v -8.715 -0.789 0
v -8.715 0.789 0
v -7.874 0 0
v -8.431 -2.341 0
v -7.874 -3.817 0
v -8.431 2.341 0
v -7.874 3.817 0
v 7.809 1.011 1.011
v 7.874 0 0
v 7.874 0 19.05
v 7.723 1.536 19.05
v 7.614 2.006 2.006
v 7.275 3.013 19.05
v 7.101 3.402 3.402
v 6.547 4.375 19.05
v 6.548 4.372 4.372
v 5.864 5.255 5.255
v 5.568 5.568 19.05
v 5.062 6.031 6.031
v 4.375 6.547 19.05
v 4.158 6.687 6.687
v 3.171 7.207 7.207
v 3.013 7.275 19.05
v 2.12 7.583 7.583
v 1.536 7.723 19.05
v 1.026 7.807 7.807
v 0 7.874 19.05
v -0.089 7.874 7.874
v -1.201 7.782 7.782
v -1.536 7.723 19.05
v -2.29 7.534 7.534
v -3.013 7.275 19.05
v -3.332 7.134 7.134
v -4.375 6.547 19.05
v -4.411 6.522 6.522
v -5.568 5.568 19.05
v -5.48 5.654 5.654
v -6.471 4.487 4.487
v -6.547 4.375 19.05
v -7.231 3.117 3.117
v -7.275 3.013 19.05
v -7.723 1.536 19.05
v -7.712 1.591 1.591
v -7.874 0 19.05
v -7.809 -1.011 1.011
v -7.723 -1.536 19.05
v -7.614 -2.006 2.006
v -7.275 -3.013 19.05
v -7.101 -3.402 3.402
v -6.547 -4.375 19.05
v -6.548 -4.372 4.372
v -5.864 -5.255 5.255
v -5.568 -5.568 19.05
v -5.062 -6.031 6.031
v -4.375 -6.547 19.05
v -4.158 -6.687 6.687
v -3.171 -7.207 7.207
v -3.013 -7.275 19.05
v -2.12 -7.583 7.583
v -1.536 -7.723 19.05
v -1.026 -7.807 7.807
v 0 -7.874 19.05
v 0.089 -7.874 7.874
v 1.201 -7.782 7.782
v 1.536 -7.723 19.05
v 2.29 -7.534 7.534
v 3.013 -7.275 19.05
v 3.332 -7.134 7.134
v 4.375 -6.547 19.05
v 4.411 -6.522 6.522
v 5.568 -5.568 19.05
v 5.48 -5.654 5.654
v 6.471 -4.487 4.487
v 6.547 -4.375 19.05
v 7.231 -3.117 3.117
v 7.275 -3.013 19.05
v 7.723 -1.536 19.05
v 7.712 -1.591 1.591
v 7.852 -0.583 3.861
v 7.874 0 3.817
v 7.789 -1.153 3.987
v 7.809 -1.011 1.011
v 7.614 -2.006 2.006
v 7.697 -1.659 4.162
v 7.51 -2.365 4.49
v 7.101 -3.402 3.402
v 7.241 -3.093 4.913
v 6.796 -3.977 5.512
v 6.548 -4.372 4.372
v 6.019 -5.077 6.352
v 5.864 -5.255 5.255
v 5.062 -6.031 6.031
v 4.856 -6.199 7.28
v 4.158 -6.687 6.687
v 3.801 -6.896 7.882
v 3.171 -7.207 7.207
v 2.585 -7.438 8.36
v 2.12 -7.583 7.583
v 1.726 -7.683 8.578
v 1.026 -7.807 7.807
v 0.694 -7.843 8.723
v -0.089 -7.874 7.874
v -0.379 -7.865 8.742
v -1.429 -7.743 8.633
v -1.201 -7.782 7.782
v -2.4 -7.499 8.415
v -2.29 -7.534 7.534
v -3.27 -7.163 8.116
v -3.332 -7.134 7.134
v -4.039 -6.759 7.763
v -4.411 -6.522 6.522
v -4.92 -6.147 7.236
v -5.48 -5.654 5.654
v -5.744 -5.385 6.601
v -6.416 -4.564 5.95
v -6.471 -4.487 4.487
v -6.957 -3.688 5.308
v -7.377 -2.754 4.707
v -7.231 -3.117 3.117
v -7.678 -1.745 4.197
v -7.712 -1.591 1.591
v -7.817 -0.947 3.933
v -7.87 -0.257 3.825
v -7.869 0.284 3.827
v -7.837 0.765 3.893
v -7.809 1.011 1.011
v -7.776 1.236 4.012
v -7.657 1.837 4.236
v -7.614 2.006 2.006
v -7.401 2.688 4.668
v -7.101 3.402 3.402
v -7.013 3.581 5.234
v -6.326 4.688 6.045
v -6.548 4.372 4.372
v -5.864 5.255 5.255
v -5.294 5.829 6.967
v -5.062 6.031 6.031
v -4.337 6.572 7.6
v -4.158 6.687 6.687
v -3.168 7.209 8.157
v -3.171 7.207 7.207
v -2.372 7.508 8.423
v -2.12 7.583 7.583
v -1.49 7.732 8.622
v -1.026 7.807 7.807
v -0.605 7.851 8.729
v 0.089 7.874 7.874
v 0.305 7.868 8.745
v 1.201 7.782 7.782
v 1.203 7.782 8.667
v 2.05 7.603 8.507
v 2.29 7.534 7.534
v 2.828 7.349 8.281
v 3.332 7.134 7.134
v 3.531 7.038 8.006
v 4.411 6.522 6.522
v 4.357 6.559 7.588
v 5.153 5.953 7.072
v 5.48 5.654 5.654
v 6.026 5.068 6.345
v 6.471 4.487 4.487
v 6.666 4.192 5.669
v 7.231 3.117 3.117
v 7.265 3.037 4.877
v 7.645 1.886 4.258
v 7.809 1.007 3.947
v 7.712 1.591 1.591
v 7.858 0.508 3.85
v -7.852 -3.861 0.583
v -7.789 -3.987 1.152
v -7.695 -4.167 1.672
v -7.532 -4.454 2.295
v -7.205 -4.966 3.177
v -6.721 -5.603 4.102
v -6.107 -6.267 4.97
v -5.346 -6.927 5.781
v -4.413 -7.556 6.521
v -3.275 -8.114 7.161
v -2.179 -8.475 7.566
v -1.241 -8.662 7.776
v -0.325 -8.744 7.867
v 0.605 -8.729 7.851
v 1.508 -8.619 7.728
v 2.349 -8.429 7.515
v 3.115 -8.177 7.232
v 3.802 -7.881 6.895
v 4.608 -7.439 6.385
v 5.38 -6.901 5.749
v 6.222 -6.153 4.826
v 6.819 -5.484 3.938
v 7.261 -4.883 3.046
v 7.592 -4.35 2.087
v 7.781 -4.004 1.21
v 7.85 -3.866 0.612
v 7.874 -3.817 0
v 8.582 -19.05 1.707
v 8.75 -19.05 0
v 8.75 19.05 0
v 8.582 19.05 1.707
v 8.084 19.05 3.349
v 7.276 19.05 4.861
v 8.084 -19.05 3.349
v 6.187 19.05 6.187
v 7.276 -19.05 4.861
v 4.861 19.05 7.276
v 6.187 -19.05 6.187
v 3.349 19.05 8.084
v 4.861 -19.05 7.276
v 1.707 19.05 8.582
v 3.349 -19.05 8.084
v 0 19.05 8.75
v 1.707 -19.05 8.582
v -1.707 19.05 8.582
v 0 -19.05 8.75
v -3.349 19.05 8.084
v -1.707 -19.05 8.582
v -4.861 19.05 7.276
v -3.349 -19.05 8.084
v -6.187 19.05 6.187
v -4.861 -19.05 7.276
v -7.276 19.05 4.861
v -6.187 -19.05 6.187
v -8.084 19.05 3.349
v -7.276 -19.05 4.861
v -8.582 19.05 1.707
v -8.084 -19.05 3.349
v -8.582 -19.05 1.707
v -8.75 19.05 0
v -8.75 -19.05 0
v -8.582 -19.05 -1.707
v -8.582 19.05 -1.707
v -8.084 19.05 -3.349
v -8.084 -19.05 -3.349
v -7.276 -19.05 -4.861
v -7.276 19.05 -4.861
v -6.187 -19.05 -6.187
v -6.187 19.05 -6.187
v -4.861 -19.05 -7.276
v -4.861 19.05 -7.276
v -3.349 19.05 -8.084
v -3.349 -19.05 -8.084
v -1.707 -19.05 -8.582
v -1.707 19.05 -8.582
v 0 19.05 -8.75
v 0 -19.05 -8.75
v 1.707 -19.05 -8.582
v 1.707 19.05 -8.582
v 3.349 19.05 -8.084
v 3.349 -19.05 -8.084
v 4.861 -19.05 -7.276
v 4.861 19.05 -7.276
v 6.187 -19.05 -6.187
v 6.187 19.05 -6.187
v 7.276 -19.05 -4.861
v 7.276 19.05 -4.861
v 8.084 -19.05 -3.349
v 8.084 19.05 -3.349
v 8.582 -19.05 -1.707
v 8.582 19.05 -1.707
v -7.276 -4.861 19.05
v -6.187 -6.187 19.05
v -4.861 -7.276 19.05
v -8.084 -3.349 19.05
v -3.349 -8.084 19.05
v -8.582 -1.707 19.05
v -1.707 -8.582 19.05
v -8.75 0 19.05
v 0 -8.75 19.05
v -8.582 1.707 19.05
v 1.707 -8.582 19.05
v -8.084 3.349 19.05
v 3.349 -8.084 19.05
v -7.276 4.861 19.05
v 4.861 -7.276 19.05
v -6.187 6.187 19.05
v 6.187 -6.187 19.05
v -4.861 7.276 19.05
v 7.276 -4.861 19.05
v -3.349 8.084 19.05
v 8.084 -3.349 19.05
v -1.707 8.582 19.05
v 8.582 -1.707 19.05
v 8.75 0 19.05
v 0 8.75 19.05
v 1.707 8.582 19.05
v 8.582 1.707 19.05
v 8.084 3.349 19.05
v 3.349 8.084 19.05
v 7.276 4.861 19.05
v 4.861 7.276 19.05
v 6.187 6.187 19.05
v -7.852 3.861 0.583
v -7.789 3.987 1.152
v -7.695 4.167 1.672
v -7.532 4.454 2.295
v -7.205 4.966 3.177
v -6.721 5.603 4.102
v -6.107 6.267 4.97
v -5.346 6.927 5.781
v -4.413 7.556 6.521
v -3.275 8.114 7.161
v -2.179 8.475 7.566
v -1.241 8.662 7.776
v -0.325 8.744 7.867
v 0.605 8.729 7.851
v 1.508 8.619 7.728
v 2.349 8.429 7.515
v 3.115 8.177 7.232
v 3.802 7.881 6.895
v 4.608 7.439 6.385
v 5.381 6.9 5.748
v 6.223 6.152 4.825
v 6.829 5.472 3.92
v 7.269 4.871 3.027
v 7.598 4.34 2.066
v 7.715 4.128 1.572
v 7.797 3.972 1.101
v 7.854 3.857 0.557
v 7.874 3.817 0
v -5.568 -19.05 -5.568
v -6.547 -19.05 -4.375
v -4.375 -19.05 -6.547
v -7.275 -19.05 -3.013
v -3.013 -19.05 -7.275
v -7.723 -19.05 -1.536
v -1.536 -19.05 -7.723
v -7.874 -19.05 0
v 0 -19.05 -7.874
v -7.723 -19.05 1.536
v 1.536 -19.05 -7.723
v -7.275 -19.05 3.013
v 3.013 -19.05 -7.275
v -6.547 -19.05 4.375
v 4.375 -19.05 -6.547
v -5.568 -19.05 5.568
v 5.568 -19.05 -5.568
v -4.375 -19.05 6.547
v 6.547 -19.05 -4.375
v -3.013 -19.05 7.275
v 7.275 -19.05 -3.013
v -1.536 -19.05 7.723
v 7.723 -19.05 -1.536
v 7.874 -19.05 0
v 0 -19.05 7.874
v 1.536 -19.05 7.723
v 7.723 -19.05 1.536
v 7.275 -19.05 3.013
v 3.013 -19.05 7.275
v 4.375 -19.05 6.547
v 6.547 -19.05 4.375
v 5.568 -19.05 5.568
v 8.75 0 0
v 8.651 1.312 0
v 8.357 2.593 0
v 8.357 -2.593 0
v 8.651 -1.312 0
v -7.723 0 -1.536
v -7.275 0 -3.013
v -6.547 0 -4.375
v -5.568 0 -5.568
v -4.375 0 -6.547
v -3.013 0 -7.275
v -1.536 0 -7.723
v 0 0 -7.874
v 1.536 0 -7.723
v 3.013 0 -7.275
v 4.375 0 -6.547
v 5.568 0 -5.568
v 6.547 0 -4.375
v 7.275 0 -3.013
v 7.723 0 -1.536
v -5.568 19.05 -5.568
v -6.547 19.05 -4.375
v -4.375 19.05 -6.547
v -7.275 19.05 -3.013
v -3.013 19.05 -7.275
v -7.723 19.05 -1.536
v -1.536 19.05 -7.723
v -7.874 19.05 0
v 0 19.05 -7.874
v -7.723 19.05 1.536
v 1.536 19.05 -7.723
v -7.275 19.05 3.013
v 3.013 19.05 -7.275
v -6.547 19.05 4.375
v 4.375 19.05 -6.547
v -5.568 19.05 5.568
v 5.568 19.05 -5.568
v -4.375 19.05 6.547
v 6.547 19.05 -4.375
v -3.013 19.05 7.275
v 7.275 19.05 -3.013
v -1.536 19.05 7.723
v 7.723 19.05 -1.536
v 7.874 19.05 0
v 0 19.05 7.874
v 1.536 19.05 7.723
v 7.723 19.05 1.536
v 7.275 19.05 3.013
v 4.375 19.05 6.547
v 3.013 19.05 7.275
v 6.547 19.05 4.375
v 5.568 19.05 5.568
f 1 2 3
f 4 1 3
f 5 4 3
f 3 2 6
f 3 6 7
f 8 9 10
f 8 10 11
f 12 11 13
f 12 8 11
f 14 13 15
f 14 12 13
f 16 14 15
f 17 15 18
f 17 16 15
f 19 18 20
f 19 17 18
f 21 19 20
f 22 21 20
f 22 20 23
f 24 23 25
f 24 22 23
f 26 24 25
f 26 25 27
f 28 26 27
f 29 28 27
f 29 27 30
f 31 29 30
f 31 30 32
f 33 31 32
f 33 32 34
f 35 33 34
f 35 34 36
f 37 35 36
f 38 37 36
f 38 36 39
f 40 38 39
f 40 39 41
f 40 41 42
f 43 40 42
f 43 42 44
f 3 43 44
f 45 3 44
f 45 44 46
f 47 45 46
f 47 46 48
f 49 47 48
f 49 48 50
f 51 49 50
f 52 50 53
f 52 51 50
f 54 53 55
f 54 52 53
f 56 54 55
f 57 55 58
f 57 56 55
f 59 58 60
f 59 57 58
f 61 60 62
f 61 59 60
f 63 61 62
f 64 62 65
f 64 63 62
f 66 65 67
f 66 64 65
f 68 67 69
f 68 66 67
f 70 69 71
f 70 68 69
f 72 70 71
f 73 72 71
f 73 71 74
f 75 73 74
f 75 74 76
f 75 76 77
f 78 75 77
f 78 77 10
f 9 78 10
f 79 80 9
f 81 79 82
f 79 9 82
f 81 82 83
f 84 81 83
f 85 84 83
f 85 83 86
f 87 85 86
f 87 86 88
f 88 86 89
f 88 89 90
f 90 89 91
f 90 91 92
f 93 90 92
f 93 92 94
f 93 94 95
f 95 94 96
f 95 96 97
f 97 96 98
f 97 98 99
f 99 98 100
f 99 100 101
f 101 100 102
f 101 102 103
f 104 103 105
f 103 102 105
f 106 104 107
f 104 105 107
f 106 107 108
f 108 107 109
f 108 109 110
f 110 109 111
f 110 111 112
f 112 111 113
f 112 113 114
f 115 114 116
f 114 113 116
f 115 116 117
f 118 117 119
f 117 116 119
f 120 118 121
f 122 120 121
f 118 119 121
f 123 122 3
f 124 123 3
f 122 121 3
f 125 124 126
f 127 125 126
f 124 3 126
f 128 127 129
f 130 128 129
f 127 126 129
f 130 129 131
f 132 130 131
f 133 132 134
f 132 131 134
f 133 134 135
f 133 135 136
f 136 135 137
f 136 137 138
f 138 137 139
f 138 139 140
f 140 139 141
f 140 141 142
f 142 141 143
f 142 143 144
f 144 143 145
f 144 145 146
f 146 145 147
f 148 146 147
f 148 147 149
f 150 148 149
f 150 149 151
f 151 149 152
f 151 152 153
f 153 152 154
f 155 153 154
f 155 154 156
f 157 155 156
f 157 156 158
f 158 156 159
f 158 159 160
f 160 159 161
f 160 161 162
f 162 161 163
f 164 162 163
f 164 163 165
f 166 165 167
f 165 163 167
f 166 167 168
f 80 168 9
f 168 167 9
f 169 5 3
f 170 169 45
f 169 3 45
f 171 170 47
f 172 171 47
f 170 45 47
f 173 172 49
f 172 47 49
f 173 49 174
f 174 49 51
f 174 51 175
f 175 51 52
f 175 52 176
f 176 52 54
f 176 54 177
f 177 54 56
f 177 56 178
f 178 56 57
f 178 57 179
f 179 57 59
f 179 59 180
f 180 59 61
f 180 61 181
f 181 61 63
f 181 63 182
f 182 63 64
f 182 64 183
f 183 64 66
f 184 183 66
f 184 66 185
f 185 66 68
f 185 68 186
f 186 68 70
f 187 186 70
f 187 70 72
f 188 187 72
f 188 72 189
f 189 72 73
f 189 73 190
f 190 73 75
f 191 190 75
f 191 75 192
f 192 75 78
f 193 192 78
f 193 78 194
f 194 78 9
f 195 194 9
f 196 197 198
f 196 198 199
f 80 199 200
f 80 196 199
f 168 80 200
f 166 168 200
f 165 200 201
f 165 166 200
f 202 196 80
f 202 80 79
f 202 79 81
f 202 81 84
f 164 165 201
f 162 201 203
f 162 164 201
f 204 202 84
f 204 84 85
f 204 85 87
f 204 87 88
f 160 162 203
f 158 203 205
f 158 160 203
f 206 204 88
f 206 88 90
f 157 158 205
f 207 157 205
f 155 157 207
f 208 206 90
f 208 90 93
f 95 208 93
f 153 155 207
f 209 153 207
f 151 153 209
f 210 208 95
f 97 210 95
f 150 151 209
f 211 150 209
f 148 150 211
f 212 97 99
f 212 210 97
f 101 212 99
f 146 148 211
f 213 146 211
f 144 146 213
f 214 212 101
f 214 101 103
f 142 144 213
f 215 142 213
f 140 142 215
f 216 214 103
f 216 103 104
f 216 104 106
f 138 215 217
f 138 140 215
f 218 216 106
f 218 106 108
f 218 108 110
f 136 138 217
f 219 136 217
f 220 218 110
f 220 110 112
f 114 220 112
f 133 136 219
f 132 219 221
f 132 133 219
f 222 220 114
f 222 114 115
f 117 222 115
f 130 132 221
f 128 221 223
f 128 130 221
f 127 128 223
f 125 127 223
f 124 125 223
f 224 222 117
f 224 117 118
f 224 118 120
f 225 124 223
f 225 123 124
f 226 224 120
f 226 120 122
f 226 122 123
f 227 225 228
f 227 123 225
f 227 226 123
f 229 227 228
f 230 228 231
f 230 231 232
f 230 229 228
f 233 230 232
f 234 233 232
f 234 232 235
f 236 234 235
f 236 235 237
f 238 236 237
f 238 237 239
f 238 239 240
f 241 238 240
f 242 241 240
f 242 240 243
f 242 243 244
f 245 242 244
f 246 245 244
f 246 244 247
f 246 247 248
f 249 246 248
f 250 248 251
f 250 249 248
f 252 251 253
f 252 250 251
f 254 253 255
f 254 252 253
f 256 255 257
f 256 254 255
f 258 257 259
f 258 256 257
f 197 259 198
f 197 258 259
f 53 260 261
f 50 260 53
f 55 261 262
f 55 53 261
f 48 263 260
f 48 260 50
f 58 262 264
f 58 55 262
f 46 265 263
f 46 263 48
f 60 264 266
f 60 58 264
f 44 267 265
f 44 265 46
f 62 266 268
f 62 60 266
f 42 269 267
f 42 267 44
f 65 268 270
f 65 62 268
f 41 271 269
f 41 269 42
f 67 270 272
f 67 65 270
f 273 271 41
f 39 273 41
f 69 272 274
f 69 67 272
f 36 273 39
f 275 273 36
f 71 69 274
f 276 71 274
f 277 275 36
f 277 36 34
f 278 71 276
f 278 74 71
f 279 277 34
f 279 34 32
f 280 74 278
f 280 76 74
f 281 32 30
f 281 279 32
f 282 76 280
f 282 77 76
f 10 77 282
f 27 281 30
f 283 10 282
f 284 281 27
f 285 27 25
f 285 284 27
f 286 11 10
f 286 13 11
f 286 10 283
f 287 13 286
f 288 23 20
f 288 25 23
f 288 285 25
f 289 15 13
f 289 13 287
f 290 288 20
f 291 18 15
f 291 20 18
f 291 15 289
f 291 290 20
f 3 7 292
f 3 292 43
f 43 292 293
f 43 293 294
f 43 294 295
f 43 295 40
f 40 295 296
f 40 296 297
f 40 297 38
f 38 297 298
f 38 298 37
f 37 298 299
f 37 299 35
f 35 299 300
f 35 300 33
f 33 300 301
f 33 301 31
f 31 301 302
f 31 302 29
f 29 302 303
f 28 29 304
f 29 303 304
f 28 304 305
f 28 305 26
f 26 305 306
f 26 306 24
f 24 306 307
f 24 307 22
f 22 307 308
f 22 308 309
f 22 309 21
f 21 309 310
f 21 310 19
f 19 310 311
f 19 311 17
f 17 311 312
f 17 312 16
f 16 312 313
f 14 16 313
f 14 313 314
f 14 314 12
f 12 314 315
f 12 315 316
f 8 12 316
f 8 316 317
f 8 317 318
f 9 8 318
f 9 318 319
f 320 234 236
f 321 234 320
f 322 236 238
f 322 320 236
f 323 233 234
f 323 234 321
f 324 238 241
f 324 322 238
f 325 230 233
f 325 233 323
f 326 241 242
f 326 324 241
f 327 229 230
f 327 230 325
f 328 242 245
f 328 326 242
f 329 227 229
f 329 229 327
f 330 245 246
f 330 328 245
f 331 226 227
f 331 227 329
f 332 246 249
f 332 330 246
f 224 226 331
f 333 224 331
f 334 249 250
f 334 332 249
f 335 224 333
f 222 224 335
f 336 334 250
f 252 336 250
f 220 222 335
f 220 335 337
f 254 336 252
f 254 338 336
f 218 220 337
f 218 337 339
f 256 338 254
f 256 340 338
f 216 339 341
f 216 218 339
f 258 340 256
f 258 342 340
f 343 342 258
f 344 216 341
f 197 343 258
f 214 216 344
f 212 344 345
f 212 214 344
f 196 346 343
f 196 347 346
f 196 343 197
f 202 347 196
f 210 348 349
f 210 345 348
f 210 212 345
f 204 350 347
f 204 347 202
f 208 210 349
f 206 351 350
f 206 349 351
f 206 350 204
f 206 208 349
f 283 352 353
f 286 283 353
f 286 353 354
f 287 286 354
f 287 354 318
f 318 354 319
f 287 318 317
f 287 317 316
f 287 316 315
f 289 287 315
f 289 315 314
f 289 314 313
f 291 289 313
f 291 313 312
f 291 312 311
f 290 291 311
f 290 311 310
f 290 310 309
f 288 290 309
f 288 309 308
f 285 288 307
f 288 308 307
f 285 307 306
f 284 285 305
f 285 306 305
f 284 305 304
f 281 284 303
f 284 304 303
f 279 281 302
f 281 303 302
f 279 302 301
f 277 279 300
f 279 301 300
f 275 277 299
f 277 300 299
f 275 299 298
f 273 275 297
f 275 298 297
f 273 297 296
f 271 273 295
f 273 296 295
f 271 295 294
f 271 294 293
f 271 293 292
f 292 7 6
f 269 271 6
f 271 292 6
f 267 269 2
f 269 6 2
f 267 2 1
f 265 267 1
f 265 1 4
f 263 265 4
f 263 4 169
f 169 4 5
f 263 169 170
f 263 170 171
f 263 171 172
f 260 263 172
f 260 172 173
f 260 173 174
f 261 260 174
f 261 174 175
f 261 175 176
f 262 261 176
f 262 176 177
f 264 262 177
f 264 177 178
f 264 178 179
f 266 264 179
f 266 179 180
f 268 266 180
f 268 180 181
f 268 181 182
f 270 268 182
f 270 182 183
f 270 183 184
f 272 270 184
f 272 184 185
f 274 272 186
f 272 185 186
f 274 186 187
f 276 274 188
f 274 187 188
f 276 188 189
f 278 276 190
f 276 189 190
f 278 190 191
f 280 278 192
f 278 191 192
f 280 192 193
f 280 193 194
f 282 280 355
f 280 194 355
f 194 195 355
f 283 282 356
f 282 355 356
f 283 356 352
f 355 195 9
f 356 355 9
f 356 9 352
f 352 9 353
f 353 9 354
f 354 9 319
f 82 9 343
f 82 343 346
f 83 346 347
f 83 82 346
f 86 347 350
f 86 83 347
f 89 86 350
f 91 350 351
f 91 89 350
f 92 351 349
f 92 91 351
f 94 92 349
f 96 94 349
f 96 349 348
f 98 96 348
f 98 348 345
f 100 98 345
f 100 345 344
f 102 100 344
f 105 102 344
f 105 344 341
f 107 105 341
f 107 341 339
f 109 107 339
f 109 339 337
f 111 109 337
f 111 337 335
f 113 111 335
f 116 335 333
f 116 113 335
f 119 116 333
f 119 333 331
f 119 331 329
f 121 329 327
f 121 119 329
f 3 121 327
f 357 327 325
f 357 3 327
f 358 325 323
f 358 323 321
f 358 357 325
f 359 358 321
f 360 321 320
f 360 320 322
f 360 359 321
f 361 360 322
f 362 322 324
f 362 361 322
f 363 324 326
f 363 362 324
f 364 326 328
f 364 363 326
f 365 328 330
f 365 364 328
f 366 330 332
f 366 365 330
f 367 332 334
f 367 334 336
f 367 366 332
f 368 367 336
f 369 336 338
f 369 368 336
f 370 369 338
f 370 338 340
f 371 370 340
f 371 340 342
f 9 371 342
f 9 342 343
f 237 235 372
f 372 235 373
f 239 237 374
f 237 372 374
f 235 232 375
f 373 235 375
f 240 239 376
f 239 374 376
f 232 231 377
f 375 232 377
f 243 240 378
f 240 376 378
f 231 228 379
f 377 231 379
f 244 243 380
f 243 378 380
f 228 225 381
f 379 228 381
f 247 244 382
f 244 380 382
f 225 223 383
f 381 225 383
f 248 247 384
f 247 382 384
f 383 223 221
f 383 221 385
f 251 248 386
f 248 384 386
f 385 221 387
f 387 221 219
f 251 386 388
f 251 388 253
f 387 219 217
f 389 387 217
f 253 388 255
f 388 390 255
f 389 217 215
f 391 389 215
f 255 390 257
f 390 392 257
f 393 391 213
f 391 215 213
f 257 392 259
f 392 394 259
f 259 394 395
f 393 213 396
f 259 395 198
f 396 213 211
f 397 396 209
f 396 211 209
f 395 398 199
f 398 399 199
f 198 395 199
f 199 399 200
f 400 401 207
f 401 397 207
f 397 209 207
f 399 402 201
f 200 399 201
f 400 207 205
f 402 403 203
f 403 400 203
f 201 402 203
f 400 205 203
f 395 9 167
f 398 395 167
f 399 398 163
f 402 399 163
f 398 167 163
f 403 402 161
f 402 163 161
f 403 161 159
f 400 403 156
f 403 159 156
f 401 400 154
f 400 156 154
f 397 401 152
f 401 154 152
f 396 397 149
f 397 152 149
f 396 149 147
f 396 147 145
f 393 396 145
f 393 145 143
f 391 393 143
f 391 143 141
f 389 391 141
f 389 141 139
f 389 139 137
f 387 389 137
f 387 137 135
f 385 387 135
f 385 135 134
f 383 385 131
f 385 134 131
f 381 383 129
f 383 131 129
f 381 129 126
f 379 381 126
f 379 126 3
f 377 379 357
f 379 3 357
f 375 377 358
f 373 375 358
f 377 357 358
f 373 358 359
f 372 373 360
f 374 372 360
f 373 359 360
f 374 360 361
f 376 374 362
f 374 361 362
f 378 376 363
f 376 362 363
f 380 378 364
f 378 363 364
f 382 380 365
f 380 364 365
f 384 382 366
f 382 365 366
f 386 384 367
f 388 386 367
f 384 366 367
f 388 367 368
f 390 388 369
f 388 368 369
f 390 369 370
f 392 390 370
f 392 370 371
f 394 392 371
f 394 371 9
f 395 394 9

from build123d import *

# Parameters (mm, degrees)
F0_R          = 8.7503
F0_R_2        = 7.874
F2_DEPTH      = 19.05
F2_DEPTH_BACK = 19.05
F1_R          = 8.7503
F1_R_2        = 7.874
F3_DEPTH      = 19.05
F4_D          = 15.748
F4_DEPTH      = 8.7513
F5_D          = 15.748
F5_DEPTH      = 8.7513
F6_D          = 15.748


with BuildPart() as f2:
    # F0 (on Front) → F2 (new body, two sides)
    with BuildSketch(Plane.XZ) as f2_sk:
        Circle(F0_R)
        Circle(F0_R_2, mode=Mode.SUBTRACT)
    extrude(amount=F2_DEPTH)
    extrude(f2_sk.sketch, amount=-F2_DEPTH_BACK)

    # F4 (through all, one way)
    with BuildSketch(Plane(origin=(0, 0, 0), x_dir=(1, 0, 0), z_dir=(0, 0, -1))):
        with Locations((0, 0)):
            Circle(F4_D / 2)
    extrude(amount=-F4_DEPTH, mode=Mode.SUBTRACT)


with BuildPart() as f3:
    # F1 (on Top) → F3 (new body)
    with BuildSketch(Plane.XY):
        Circle(F1_R)
        Circle(F1_R_2, mode=Mode.SUBTRACT)
    extrude(amount=F3_DEPTH)

    # F5 (through all, one way)
    with BuildSketch(Plane(origin=(0, 0, 0), x_dir=(1, 0, 0), z_dir=(0, 1, 0))):
        with Locations((0, 0)):
            Circle(F5_D / 2)
    extrude(amount=-F5_DEPTH, mode=Mode.SUBTRACT)

    # F6 (through all)
    with Locations(Plane.XZ):
        with Locations((0, 0)):
            Hole(F6_D / 2)


solid = Compound([f2.part, f3.part])
